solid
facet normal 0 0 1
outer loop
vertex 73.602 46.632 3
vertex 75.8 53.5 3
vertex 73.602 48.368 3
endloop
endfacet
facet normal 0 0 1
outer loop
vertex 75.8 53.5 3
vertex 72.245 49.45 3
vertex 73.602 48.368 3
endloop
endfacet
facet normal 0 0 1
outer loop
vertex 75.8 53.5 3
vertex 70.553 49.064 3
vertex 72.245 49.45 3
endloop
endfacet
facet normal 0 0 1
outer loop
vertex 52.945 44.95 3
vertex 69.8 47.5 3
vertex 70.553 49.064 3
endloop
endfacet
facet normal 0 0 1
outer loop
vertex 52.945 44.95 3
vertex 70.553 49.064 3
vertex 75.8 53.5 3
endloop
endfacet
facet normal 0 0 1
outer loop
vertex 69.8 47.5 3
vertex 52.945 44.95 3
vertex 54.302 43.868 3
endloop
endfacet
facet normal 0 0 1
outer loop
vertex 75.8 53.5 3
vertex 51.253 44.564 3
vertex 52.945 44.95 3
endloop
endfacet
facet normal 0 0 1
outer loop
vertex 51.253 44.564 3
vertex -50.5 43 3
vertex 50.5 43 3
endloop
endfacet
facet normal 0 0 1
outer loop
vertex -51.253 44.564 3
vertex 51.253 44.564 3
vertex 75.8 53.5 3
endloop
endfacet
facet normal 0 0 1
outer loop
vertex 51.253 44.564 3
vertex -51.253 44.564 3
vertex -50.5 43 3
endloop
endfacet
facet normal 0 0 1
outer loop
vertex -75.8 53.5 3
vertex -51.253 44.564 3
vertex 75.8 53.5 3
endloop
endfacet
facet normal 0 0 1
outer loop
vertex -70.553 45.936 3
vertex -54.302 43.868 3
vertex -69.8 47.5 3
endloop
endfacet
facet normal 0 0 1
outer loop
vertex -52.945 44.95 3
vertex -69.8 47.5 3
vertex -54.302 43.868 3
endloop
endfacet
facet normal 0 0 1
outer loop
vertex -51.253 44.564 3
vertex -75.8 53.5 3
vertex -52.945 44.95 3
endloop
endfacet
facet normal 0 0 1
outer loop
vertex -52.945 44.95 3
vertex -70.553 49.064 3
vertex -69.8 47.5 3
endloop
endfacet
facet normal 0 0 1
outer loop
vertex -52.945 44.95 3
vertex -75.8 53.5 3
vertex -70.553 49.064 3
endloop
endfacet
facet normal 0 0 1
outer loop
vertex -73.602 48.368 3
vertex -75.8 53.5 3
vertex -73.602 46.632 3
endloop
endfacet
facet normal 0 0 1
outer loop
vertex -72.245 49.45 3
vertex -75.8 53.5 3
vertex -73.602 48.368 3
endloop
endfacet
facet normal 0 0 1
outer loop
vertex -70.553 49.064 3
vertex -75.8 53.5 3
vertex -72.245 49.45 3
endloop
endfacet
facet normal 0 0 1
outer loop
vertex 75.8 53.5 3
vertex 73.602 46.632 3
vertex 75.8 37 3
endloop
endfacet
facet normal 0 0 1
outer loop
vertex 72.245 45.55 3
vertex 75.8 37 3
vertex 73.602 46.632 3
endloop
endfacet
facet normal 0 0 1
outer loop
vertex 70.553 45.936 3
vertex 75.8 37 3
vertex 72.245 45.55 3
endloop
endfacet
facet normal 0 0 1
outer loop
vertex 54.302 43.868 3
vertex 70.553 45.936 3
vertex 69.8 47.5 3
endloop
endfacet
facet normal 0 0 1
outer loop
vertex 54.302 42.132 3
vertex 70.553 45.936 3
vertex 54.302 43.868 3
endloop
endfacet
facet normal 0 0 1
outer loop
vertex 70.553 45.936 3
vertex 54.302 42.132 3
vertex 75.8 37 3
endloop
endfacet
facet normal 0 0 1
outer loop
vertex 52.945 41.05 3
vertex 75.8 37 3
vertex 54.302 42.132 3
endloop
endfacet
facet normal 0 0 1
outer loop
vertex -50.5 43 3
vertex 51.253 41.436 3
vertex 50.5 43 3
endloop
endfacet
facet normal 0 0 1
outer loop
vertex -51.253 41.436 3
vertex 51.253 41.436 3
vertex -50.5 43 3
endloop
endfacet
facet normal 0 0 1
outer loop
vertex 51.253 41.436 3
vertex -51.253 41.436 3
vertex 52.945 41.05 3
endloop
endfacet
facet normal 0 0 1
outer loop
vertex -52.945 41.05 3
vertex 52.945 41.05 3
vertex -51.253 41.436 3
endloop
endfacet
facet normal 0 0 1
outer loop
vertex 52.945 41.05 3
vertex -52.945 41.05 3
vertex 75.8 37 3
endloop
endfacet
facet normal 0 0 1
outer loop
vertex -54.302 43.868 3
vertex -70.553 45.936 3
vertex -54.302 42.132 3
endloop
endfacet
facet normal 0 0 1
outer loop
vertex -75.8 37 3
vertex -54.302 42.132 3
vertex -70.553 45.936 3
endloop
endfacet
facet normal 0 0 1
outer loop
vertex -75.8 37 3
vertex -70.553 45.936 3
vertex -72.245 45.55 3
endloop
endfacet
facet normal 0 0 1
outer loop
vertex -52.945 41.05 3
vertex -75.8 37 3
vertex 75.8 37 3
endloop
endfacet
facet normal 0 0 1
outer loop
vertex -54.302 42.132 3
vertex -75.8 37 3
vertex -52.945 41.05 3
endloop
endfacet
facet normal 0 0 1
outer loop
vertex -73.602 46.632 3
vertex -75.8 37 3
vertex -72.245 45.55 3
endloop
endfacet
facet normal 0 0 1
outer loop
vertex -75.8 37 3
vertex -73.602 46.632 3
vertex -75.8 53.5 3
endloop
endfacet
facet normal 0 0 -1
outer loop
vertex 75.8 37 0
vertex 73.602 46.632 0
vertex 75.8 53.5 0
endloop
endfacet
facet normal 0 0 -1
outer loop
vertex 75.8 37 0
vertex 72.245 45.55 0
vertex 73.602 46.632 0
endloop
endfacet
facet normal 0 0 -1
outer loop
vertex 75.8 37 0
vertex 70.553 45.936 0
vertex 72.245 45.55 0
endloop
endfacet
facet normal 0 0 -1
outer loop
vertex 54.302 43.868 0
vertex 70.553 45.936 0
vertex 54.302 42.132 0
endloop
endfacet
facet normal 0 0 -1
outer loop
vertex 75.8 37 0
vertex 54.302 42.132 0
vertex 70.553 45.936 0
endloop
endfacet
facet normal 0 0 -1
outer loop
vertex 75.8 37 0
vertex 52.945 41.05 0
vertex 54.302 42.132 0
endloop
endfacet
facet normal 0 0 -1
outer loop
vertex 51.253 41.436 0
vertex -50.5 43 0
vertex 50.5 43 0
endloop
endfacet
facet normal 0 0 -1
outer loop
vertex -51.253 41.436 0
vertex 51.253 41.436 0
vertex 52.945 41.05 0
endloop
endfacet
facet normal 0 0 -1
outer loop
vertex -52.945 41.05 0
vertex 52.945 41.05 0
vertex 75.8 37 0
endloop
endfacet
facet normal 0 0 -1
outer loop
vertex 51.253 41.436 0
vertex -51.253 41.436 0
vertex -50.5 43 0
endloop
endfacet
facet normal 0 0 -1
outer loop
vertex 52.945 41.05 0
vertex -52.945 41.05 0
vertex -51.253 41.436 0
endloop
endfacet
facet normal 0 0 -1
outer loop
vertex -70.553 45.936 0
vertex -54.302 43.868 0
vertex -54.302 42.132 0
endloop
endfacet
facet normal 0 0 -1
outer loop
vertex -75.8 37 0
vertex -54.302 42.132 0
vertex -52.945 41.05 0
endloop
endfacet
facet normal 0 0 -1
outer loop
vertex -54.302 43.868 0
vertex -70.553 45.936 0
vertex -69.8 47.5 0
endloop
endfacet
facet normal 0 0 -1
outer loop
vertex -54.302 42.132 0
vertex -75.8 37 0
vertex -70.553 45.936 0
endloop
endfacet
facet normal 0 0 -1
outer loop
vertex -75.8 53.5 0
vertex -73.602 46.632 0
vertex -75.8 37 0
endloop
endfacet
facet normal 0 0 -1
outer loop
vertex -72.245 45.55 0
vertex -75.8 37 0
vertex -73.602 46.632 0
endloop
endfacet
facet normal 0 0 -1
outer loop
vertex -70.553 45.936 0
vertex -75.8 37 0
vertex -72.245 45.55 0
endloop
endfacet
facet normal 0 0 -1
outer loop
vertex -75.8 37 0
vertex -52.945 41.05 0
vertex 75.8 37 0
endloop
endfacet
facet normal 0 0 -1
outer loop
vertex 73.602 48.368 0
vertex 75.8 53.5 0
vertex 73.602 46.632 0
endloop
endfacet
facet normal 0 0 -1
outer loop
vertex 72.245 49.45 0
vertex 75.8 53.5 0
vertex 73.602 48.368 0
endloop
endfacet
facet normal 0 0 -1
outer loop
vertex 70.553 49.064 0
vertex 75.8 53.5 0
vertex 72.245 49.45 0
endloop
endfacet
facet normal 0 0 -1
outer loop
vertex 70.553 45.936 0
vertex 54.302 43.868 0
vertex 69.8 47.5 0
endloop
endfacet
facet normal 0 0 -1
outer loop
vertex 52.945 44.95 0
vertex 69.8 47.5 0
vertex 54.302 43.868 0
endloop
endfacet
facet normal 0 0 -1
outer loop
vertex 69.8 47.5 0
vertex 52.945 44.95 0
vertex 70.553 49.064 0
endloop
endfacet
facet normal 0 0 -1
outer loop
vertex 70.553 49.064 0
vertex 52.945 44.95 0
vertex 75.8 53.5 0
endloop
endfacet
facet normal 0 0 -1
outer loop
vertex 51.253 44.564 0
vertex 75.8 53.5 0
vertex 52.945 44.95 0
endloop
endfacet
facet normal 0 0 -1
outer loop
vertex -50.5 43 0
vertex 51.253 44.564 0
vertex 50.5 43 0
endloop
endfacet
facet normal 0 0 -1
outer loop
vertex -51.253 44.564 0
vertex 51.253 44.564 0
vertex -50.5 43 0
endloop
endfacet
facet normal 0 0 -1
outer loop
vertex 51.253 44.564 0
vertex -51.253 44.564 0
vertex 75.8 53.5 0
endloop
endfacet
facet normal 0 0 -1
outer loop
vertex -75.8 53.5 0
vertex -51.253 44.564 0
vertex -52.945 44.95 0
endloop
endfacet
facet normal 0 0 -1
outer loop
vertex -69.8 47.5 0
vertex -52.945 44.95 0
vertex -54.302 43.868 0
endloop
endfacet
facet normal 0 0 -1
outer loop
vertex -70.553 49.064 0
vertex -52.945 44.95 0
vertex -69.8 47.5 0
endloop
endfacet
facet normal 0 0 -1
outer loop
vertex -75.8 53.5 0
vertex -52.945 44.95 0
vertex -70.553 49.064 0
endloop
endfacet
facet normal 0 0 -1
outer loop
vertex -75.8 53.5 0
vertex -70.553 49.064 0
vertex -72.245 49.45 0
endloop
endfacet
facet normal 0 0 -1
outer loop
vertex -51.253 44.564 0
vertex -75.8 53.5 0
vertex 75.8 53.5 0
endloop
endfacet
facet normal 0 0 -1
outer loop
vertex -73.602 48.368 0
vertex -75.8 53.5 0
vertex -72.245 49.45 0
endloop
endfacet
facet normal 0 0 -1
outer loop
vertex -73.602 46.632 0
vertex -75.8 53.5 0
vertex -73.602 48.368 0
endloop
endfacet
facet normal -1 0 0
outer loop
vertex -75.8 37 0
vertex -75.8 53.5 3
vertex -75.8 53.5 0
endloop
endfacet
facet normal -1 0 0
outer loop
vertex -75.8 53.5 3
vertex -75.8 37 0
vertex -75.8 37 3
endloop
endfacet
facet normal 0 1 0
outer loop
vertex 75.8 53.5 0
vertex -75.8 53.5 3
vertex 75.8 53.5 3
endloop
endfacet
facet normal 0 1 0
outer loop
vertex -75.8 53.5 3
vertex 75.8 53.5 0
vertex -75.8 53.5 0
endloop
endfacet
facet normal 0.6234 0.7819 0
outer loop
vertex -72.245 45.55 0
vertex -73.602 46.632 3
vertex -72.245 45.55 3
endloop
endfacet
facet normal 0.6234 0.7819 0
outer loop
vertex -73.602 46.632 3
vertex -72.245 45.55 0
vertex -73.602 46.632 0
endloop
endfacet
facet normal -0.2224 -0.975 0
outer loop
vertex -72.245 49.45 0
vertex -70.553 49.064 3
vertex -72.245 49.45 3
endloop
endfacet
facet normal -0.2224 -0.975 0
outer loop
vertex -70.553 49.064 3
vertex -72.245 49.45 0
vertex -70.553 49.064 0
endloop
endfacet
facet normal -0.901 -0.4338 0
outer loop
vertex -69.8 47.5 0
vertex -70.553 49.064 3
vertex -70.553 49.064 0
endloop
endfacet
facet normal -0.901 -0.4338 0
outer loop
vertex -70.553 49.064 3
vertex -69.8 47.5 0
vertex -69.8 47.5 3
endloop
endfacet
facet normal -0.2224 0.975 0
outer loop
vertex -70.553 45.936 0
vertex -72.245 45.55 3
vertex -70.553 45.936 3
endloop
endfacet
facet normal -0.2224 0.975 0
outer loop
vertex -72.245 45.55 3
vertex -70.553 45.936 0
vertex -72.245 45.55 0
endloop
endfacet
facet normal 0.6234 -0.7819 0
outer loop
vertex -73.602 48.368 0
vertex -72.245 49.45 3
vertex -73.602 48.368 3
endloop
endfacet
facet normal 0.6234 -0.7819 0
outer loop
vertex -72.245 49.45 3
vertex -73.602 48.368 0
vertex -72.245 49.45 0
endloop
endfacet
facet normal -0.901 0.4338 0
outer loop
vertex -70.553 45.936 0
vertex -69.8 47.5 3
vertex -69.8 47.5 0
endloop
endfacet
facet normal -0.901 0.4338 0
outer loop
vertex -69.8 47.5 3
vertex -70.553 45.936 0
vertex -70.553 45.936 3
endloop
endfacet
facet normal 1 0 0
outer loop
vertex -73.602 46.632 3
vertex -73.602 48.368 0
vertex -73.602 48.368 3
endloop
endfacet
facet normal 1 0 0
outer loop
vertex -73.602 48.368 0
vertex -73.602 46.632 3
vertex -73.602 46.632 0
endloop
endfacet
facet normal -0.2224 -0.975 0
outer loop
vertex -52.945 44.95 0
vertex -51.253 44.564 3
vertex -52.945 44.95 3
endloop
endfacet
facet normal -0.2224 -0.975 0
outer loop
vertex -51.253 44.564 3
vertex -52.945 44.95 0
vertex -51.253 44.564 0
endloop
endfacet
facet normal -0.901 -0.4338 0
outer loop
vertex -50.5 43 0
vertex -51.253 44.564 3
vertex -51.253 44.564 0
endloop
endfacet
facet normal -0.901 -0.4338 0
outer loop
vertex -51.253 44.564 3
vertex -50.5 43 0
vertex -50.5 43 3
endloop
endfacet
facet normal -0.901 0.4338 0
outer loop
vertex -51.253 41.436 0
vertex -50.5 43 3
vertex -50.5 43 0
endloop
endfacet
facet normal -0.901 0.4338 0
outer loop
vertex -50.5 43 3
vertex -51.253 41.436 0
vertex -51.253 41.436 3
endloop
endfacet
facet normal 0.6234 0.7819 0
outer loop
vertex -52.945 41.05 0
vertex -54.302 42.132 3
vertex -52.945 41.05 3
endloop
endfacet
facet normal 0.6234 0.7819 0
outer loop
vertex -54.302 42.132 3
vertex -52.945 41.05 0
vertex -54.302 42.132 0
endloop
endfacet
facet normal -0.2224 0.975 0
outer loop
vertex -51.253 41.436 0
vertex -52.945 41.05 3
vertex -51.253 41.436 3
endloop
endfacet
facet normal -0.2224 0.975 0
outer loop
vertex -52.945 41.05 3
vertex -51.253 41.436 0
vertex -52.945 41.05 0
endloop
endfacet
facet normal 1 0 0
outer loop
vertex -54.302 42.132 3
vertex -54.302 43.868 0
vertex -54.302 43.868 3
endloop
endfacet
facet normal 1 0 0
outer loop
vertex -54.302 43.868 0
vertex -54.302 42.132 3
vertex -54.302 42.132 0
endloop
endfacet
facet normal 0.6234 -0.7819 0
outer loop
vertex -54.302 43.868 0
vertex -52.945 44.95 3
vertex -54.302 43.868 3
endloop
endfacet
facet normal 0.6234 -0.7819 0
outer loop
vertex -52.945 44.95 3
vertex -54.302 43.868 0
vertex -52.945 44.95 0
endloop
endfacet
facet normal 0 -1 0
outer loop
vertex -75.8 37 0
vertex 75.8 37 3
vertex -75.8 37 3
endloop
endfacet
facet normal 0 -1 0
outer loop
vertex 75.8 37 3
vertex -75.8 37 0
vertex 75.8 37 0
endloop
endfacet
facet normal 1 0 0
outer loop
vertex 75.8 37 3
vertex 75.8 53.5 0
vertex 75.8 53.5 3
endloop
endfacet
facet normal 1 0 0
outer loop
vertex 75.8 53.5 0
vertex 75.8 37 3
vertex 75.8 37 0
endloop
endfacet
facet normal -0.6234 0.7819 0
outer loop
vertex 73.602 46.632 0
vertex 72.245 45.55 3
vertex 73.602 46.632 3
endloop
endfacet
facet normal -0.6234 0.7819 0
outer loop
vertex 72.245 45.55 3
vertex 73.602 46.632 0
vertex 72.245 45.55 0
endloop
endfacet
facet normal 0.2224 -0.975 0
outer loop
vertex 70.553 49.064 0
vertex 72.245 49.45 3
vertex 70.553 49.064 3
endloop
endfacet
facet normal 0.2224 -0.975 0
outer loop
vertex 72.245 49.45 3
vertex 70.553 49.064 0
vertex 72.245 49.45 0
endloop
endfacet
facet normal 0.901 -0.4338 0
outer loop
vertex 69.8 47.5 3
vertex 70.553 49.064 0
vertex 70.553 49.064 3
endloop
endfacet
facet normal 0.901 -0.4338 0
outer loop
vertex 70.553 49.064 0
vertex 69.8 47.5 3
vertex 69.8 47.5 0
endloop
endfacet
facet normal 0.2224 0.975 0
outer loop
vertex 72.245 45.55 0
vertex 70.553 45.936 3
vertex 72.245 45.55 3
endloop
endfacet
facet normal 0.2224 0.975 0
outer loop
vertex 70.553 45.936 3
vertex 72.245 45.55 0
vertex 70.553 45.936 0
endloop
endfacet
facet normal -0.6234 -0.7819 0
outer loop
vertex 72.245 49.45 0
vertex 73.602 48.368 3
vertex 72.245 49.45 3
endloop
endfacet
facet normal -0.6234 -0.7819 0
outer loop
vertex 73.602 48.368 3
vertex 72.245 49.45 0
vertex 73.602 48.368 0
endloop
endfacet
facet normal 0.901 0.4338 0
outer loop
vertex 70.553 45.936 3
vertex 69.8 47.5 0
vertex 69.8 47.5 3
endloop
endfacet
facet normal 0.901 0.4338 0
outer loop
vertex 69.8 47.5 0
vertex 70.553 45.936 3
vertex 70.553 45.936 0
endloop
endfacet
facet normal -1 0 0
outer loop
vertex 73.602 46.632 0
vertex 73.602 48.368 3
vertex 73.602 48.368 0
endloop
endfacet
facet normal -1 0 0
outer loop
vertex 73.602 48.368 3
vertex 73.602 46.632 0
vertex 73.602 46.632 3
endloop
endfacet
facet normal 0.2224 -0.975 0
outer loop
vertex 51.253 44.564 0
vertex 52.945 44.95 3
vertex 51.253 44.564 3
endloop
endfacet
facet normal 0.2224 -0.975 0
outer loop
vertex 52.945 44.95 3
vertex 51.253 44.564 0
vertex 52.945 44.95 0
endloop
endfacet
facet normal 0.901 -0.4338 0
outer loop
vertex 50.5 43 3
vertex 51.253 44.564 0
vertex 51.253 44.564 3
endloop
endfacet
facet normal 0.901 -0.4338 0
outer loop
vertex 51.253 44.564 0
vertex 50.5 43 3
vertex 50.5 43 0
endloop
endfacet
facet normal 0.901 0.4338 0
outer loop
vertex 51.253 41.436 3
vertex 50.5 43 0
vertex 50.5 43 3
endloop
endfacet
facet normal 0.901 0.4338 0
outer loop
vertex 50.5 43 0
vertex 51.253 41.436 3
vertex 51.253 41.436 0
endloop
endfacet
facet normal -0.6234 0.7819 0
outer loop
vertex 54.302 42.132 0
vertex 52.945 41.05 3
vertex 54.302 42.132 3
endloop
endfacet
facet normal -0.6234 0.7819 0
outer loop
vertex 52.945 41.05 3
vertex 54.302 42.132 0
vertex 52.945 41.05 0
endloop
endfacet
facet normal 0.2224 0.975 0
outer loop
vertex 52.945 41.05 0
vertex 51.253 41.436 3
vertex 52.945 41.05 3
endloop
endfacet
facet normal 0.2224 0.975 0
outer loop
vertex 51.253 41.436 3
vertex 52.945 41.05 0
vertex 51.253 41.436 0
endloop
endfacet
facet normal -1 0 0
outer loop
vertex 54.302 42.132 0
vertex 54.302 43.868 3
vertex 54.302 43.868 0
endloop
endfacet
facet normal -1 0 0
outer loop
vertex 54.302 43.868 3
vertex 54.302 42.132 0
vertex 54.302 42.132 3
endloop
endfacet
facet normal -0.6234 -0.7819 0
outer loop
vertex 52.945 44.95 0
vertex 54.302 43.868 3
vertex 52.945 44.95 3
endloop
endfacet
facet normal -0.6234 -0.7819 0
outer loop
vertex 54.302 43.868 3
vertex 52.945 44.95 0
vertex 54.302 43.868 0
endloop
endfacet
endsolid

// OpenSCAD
/**
* Variables
**/
outerLength=143.6;
outerWidth = 95;
innerLength = 105;
innerWidth = 86;
lengthPadding = 4;
widthPadding = 6;
height = 3;
holeRadius = 2;

/**
* Modules
**/
module hole() {
    cylinder(height * 2, holeRadius, holeRadius);
}

module quarter() {
    difference() {
        union() {
            translate([-outerLength / 2 - lengthPadding, 0, 0])
            cube([outerLength / 2 + lengthPadding, outerWidth / 2 + widthPadding, height]);
        }
        translate([-outerLength / 2, outerWidth / 2, 0]) hole();
        translate([-innerLength / 2, innerWidth / 2, 0]) hole();
        
        translate([-outerLength / 2 - lengthPadding, 0, 0])
        cube([outerLength / 2 + lengthPadding, innerWidth / 2 - widthPadding, height + 2]);
    }
}


/**
* Shape
**/
quarter();

mirror([1, 0, 0]) quarter();
